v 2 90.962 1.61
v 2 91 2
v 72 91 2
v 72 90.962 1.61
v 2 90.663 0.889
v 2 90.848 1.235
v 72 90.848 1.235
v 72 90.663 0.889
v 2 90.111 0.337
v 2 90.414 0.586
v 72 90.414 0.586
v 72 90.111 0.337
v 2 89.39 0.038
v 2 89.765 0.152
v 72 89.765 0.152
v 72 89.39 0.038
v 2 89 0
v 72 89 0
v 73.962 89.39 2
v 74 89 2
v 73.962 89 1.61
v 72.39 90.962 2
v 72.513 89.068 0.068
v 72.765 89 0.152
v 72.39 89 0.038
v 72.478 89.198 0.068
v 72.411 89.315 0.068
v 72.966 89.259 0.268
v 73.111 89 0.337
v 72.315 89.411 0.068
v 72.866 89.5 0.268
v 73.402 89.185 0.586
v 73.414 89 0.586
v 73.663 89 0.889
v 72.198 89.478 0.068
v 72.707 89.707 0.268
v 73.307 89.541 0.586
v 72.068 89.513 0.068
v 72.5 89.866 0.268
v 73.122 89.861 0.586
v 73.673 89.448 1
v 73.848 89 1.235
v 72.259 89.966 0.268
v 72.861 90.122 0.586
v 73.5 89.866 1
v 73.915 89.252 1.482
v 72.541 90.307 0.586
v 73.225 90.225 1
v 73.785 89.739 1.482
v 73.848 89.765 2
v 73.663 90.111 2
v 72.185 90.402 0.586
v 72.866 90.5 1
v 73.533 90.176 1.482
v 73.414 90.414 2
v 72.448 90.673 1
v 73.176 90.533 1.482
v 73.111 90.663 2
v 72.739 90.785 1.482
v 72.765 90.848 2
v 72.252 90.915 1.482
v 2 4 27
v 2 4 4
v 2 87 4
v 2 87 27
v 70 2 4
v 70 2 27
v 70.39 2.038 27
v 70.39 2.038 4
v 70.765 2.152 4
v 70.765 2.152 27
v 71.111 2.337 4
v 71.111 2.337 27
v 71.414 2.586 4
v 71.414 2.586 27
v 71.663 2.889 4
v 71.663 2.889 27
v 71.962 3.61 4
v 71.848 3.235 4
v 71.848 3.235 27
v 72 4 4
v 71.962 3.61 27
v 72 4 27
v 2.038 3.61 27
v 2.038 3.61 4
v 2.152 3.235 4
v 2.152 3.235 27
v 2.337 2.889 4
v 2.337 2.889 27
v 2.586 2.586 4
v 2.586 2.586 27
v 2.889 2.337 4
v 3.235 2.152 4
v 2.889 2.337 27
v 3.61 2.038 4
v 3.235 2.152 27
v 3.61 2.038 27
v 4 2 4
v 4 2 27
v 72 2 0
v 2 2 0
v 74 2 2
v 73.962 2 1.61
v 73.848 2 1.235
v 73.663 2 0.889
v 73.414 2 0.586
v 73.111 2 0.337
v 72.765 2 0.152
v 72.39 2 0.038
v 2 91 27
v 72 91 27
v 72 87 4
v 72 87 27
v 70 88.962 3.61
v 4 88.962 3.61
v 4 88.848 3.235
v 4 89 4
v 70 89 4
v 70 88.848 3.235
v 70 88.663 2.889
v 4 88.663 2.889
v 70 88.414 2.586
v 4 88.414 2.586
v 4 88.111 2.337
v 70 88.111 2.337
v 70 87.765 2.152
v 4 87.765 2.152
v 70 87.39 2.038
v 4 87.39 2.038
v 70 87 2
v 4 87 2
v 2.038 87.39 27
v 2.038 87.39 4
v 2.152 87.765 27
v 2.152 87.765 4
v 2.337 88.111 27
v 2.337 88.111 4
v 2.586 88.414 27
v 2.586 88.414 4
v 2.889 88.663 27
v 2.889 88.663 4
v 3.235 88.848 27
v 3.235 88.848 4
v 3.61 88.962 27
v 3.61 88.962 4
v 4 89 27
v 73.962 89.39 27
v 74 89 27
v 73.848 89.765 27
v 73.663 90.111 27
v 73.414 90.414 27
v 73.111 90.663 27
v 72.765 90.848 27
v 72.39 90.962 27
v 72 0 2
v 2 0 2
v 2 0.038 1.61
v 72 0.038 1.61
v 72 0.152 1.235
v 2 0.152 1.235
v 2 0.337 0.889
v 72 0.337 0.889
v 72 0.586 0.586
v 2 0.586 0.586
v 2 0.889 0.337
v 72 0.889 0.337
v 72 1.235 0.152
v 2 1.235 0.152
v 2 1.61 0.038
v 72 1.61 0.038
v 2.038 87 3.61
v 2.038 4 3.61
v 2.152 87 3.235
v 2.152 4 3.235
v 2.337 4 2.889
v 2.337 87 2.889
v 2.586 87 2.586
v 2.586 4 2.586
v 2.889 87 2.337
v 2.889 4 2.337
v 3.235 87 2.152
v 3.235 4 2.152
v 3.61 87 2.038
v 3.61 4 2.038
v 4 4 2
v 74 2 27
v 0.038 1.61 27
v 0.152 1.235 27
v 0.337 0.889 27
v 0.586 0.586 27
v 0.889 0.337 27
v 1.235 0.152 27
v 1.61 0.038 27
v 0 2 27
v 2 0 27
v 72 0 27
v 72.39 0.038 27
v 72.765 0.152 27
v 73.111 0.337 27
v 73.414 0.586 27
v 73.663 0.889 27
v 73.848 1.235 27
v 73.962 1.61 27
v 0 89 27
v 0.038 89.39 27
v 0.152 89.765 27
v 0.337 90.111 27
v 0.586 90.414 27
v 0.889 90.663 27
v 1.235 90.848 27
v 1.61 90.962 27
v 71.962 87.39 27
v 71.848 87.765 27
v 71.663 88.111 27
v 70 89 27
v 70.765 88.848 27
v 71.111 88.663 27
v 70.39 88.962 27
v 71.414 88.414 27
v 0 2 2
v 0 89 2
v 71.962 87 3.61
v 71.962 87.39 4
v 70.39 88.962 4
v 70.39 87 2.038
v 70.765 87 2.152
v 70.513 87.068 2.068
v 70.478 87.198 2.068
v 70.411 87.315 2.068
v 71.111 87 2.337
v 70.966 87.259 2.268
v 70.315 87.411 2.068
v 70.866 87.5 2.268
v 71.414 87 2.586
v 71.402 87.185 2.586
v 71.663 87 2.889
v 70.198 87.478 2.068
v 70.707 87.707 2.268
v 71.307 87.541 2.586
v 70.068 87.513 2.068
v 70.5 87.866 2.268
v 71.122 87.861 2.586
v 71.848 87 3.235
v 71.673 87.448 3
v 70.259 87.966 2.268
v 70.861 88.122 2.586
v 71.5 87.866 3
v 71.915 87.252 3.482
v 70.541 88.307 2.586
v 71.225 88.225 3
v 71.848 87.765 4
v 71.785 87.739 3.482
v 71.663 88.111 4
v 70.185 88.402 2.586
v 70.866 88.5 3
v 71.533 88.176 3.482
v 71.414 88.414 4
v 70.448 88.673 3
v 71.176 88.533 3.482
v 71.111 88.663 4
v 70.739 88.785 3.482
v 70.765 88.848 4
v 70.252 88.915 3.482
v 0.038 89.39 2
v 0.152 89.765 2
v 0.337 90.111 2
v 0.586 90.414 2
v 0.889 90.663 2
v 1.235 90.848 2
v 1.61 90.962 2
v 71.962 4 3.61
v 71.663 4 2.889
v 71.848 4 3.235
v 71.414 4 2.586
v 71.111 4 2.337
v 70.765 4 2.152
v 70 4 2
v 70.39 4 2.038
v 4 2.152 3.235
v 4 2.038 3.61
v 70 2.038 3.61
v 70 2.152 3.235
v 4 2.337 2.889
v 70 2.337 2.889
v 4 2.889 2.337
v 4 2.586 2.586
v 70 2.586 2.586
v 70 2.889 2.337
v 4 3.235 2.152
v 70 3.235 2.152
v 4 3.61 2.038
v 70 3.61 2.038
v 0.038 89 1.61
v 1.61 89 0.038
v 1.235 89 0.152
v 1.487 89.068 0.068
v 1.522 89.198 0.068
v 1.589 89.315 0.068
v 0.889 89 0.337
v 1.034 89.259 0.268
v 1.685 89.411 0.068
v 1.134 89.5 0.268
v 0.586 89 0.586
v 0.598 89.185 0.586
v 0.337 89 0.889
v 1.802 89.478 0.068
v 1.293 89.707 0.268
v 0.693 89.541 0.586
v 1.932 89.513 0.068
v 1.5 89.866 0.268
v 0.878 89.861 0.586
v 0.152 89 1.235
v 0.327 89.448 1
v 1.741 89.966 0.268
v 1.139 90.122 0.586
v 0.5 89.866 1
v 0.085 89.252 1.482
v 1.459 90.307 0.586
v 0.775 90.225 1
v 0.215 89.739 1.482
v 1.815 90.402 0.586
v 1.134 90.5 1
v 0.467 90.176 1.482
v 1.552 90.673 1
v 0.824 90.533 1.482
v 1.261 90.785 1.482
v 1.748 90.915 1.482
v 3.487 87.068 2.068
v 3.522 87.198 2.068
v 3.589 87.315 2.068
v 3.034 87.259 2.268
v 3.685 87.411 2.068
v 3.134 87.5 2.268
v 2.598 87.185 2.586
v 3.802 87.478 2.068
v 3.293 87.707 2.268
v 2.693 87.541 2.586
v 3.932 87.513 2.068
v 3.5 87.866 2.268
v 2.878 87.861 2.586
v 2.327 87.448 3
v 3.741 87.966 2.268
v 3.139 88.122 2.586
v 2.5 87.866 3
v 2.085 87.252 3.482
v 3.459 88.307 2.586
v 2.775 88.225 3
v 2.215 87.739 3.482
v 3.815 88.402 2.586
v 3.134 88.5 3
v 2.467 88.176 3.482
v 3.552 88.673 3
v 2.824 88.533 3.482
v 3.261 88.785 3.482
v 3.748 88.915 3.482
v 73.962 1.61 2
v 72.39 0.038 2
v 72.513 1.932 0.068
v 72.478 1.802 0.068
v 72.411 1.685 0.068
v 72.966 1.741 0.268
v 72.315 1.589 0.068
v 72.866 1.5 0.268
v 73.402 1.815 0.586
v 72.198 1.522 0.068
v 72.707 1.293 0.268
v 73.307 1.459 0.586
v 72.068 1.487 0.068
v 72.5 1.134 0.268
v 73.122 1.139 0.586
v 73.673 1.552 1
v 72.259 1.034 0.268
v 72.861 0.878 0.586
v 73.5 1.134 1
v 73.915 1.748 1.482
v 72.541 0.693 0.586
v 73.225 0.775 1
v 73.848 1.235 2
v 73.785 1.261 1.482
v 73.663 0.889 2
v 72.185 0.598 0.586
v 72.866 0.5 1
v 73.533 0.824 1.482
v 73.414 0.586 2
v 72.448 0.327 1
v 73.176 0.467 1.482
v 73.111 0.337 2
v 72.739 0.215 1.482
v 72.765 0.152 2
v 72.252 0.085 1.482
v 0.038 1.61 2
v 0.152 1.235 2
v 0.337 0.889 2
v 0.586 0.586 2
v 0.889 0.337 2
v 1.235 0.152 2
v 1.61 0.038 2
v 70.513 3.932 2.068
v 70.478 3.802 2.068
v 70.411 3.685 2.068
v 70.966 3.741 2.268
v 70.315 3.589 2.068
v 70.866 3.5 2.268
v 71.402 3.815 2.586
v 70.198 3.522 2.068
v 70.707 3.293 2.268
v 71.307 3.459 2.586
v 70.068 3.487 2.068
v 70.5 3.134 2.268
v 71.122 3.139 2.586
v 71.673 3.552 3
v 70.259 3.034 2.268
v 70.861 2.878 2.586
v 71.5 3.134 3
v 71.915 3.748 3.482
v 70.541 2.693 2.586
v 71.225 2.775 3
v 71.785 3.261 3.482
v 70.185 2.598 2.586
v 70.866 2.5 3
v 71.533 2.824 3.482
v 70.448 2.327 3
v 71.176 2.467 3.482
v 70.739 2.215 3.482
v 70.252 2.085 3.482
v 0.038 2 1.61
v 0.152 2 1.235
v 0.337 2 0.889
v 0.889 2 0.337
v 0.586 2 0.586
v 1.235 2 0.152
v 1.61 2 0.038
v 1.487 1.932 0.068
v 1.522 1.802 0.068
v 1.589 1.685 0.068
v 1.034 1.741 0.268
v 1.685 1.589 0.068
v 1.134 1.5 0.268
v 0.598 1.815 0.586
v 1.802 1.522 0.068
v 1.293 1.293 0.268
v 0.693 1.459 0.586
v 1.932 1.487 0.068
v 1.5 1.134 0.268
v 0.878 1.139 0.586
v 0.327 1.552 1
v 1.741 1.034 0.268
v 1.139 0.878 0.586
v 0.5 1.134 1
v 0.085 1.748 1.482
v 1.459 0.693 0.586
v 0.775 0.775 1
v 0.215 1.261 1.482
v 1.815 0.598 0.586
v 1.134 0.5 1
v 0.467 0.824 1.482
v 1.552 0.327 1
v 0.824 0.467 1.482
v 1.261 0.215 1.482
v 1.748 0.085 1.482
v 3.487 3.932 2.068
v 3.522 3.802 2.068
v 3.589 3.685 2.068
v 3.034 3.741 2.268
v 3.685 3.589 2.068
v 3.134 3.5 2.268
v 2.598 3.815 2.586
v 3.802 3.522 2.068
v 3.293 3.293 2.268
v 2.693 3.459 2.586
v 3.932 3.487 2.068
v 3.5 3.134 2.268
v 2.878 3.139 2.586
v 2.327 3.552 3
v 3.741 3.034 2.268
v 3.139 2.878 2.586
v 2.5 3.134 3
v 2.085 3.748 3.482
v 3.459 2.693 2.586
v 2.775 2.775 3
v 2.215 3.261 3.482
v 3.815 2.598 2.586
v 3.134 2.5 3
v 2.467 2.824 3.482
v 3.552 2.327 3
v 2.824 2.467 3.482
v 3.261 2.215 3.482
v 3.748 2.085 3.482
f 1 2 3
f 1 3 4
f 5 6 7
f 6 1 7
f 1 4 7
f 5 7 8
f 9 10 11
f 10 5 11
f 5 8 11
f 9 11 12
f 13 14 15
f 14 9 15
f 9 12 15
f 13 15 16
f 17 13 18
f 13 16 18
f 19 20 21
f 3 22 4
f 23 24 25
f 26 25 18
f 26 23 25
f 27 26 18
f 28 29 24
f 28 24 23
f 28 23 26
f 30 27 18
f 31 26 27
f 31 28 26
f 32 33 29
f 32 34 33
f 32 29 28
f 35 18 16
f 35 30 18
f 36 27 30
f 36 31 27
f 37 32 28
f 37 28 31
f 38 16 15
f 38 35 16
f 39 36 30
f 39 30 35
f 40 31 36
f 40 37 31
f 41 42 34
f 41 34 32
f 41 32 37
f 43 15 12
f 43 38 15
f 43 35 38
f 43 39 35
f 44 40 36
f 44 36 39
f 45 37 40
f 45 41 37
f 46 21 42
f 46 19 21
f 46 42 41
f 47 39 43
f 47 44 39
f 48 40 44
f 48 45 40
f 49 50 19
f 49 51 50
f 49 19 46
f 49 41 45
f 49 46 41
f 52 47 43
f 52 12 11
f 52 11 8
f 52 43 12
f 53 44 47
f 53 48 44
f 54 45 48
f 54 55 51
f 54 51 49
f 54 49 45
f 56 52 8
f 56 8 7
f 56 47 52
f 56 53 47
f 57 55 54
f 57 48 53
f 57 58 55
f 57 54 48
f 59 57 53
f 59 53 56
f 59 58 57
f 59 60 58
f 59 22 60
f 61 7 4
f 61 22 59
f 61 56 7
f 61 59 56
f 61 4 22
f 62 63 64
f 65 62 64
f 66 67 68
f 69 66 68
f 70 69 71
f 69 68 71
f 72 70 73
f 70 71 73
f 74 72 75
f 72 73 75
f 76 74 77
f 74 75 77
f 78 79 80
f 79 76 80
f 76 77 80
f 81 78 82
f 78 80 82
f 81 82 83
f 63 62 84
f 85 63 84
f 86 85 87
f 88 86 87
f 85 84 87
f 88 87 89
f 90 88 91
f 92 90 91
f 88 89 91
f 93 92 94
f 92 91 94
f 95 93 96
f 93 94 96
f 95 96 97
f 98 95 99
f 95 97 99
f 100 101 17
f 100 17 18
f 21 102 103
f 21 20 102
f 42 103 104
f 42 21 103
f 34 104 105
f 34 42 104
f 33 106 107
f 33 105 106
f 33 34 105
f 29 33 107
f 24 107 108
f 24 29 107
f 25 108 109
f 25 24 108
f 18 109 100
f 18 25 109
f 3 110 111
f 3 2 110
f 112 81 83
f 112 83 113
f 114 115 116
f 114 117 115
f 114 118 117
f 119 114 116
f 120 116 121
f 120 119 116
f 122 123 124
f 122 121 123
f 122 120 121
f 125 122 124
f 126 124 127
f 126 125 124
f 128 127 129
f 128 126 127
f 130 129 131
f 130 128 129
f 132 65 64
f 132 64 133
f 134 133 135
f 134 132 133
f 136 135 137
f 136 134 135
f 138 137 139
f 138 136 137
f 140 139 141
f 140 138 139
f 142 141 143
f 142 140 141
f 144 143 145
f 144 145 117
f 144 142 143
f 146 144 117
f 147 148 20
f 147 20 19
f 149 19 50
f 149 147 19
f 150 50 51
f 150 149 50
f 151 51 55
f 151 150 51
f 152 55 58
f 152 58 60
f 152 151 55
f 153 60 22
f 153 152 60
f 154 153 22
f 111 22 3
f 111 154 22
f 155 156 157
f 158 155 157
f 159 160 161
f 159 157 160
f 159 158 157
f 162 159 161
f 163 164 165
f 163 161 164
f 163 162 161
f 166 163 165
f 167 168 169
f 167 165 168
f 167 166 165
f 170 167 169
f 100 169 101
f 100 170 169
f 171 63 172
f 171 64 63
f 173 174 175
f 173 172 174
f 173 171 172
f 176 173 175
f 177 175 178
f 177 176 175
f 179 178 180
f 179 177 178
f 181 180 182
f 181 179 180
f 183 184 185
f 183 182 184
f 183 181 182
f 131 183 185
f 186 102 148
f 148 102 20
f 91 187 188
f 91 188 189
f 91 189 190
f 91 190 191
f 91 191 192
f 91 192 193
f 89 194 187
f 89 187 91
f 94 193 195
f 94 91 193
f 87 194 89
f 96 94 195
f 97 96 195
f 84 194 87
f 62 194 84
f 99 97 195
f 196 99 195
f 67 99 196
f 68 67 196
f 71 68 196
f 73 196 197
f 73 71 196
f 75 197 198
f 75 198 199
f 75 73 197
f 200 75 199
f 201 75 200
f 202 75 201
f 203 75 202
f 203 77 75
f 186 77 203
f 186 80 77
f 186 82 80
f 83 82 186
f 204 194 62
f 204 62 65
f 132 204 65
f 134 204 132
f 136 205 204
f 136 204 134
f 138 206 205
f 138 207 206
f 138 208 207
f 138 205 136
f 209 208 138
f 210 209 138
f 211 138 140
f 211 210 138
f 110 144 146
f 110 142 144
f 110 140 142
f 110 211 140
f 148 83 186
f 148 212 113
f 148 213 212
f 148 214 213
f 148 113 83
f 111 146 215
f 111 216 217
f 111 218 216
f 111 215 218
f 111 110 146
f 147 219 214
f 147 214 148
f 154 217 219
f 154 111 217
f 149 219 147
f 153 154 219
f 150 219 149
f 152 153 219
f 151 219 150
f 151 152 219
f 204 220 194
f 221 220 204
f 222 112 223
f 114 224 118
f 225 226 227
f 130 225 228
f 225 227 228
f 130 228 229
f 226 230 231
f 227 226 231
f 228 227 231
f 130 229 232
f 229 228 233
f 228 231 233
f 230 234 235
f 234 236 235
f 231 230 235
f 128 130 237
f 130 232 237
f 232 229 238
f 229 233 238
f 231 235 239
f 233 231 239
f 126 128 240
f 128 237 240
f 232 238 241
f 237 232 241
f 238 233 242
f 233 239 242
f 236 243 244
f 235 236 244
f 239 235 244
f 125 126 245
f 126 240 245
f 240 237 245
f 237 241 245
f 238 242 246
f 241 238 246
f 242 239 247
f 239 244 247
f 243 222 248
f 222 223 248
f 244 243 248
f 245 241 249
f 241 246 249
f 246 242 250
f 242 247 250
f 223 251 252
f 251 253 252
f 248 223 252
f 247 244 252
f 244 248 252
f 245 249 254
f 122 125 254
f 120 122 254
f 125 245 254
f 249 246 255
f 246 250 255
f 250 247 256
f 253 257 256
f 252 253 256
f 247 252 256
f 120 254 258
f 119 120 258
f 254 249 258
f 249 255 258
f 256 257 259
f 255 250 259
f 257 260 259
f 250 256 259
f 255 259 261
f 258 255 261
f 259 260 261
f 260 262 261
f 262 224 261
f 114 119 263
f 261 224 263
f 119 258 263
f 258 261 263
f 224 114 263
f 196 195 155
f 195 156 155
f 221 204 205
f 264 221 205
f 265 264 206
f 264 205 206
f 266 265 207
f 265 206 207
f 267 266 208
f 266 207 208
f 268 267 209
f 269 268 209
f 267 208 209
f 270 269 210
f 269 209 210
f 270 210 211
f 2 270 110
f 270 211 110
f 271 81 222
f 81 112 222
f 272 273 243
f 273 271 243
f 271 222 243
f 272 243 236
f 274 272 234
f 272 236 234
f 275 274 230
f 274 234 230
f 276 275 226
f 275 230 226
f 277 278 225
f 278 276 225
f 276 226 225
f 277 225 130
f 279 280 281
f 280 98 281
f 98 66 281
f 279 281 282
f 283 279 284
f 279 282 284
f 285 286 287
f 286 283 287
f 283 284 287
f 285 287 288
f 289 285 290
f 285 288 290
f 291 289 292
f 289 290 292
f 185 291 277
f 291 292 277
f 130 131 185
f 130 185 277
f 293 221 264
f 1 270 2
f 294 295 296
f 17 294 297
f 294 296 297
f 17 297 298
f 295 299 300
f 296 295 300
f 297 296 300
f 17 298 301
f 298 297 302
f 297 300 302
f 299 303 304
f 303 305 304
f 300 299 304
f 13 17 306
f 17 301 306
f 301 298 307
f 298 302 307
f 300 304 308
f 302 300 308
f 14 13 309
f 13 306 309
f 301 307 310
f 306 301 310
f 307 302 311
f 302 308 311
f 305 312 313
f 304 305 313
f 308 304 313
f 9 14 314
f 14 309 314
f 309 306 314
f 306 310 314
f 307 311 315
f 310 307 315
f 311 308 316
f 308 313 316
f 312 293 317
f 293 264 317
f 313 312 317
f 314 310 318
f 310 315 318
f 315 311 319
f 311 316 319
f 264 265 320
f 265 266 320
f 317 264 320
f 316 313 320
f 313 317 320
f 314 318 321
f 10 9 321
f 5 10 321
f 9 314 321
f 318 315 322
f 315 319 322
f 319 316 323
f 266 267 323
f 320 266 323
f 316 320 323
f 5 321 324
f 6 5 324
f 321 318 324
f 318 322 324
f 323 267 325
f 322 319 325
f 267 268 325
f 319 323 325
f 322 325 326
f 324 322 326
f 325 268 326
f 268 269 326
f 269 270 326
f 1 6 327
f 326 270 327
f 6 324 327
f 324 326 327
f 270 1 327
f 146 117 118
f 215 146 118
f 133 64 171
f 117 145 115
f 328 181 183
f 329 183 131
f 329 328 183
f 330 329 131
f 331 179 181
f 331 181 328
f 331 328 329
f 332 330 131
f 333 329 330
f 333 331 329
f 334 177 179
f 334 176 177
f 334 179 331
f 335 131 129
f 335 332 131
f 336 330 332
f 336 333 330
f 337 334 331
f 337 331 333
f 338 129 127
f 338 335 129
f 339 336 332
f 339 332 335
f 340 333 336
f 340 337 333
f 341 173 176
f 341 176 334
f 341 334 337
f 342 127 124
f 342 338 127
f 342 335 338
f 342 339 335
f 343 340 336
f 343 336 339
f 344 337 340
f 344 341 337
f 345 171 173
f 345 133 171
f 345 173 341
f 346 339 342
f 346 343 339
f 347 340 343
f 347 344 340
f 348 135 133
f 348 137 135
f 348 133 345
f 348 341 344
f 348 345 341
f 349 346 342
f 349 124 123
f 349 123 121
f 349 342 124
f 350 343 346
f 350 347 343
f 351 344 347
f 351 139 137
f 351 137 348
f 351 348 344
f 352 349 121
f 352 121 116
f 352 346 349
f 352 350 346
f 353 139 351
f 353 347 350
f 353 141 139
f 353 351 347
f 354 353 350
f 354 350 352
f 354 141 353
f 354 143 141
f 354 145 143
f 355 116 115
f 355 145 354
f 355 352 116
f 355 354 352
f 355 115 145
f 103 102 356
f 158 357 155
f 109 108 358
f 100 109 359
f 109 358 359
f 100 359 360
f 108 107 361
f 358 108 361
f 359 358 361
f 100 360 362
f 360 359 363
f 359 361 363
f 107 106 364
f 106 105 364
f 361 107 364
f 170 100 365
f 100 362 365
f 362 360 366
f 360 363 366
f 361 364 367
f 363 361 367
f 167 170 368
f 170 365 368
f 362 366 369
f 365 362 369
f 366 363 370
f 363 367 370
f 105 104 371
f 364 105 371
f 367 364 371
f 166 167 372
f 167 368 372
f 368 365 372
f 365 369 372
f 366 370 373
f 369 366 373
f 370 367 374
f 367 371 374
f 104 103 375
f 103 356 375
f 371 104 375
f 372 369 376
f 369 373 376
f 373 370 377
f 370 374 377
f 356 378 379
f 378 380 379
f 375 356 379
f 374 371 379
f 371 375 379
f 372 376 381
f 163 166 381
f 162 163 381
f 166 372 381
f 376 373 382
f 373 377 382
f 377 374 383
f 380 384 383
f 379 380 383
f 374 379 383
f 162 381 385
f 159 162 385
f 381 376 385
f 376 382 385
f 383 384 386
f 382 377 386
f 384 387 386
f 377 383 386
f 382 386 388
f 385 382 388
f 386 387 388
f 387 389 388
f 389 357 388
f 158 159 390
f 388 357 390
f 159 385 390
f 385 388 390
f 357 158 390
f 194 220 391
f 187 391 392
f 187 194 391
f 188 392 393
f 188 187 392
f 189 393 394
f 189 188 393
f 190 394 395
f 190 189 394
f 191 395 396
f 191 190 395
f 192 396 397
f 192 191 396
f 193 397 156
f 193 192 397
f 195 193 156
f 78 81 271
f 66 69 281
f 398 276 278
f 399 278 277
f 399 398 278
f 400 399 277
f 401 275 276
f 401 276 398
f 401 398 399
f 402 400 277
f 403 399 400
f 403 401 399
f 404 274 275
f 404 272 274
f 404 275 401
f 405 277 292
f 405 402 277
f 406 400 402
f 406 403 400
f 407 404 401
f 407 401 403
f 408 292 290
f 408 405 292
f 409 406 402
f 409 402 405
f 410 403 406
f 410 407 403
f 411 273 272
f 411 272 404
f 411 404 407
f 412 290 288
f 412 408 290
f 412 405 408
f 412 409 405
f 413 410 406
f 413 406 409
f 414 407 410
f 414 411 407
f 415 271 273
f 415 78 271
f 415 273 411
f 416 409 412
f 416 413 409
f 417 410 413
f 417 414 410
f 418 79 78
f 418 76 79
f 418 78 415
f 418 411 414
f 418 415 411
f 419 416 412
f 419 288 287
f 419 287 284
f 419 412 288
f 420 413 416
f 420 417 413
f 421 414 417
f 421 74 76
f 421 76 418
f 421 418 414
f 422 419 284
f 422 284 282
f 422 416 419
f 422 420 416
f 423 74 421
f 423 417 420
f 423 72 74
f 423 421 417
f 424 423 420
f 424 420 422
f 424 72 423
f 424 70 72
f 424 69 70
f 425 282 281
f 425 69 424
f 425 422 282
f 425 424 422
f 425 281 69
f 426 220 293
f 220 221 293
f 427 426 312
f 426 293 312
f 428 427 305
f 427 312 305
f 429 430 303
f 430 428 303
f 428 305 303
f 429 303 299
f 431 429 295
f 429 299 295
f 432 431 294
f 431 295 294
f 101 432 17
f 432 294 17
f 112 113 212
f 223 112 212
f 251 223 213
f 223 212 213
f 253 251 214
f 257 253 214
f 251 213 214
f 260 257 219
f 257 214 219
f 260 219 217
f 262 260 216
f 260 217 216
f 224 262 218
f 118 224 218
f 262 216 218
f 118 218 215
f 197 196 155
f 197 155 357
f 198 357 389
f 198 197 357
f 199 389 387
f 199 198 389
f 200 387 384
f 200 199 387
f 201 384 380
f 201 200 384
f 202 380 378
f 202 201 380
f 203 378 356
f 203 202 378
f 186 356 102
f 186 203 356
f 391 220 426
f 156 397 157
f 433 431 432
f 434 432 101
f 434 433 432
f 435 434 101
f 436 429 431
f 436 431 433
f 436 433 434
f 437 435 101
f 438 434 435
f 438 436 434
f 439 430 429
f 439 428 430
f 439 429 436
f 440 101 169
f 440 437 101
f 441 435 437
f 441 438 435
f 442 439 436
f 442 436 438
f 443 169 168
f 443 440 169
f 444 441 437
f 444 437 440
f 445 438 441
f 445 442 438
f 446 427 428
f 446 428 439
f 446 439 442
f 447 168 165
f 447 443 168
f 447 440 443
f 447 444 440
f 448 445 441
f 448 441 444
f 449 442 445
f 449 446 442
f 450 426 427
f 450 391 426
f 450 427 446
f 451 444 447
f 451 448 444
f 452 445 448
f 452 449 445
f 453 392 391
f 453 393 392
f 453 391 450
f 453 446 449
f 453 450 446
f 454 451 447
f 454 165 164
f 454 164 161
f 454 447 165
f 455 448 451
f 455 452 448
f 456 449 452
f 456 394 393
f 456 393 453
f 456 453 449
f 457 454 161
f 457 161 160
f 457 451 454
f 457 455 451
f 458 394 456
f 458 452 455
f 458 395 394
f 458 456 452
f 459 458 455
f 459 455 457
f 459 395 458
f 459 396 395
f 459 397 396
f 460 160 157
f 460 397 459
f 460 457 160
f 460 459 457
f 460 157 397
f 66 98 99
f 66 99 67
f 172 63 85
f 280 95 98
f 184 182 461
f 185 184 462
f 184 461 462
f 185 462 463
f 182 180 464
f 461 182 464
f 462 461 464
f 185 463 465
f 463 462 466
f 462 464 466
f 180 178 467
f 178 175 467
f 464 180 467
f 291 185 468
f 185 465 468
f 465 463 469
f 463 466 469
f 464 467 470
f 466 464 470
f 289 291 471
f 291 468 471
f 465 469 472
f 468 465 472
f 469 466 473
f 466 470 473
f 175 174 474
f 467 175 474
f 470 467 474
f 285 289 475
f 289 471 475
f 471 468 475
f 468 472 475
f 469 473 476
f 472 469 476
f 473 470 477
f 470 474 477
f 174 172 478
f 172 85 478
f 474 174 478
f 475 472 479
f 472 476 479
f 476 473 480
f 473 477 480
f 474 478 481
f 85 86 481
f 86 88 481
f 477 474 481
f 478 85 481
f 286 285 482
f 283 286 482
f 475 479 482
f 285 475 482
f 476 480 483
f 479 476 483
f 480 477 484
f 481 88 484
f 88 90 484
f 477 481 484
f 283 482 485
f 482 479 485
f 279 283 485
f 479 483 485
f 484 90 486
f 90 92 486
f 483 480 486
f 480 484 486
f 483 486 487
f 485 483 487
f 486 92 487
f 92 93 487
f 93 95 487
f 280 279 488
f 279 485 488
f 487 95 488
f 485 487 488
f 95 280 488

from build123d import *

# Parameters (mm, degrees)
BOX027_W     = 70
BOX027_H     = 87
BOX027_DEPTH = 39
FILLET050_R  = 2
BOX031_W     = 74
BOX031_H     = 91
BOX031_DEPTH = 27
FILLET046_R  = 2


with BuildPart() as bottomcut013:
    # Box027 → Box027 (new body)
    with BuildSketch(Plane(origin=(2, 2, 2), x_dir=(1, 0, 0), z_dir=(0, 0, 1))):
        with Locations((35, 43.5)):
            Rectangle(BOX027_W, BOX027_H)
    extrude(amount=BOX027_DEPTH)

    # Fillet050
    fillet050_edges = [bottomcut013.edges().sort_by_distance(p)[0] for p in [
        (2, 2, 21.5),
        (2, 89, 21.5),
        (2, 45.5, 2),
        (72, 2, 21.5),
        (72, 89, 21.5),
        (72, 45.5, 2),
        (37, 2, 2),
        (37, 89, 2),
    ]]
    fillet(fillet050_edges, radius=FILLET050_R)


with BuildPart() as bottom052:
    # Box031 → Box031 (new body)
    with BuildSketch(Plane.XY):
        with Locations((37, 45.5)):
            Rectangle(BOX031_W, BOX031_H)
    extrude(amount=BOX031_DEPTH)

    # Fillet046
    fillet046_edges = [bottom052.edges().sort_by_distance(p)[0] for p in [
        (0, 0, 13.5),
        (0, 91, 13.5),
        (0, 45.5, 0),
        (74, 0, 13.5),
        (74, 91, 13.5),
        (74, 45.5, 0),
        (37, 0, 0),
        (37, 91, 0),
    ]]
    fillet(fillet046_edges, radius=FILLET046_R)

    # Cut032: cut bottomCut013
    add(bottomcut013.part, mode=Mode.SUBTRACT)


solid = bottom052.part
